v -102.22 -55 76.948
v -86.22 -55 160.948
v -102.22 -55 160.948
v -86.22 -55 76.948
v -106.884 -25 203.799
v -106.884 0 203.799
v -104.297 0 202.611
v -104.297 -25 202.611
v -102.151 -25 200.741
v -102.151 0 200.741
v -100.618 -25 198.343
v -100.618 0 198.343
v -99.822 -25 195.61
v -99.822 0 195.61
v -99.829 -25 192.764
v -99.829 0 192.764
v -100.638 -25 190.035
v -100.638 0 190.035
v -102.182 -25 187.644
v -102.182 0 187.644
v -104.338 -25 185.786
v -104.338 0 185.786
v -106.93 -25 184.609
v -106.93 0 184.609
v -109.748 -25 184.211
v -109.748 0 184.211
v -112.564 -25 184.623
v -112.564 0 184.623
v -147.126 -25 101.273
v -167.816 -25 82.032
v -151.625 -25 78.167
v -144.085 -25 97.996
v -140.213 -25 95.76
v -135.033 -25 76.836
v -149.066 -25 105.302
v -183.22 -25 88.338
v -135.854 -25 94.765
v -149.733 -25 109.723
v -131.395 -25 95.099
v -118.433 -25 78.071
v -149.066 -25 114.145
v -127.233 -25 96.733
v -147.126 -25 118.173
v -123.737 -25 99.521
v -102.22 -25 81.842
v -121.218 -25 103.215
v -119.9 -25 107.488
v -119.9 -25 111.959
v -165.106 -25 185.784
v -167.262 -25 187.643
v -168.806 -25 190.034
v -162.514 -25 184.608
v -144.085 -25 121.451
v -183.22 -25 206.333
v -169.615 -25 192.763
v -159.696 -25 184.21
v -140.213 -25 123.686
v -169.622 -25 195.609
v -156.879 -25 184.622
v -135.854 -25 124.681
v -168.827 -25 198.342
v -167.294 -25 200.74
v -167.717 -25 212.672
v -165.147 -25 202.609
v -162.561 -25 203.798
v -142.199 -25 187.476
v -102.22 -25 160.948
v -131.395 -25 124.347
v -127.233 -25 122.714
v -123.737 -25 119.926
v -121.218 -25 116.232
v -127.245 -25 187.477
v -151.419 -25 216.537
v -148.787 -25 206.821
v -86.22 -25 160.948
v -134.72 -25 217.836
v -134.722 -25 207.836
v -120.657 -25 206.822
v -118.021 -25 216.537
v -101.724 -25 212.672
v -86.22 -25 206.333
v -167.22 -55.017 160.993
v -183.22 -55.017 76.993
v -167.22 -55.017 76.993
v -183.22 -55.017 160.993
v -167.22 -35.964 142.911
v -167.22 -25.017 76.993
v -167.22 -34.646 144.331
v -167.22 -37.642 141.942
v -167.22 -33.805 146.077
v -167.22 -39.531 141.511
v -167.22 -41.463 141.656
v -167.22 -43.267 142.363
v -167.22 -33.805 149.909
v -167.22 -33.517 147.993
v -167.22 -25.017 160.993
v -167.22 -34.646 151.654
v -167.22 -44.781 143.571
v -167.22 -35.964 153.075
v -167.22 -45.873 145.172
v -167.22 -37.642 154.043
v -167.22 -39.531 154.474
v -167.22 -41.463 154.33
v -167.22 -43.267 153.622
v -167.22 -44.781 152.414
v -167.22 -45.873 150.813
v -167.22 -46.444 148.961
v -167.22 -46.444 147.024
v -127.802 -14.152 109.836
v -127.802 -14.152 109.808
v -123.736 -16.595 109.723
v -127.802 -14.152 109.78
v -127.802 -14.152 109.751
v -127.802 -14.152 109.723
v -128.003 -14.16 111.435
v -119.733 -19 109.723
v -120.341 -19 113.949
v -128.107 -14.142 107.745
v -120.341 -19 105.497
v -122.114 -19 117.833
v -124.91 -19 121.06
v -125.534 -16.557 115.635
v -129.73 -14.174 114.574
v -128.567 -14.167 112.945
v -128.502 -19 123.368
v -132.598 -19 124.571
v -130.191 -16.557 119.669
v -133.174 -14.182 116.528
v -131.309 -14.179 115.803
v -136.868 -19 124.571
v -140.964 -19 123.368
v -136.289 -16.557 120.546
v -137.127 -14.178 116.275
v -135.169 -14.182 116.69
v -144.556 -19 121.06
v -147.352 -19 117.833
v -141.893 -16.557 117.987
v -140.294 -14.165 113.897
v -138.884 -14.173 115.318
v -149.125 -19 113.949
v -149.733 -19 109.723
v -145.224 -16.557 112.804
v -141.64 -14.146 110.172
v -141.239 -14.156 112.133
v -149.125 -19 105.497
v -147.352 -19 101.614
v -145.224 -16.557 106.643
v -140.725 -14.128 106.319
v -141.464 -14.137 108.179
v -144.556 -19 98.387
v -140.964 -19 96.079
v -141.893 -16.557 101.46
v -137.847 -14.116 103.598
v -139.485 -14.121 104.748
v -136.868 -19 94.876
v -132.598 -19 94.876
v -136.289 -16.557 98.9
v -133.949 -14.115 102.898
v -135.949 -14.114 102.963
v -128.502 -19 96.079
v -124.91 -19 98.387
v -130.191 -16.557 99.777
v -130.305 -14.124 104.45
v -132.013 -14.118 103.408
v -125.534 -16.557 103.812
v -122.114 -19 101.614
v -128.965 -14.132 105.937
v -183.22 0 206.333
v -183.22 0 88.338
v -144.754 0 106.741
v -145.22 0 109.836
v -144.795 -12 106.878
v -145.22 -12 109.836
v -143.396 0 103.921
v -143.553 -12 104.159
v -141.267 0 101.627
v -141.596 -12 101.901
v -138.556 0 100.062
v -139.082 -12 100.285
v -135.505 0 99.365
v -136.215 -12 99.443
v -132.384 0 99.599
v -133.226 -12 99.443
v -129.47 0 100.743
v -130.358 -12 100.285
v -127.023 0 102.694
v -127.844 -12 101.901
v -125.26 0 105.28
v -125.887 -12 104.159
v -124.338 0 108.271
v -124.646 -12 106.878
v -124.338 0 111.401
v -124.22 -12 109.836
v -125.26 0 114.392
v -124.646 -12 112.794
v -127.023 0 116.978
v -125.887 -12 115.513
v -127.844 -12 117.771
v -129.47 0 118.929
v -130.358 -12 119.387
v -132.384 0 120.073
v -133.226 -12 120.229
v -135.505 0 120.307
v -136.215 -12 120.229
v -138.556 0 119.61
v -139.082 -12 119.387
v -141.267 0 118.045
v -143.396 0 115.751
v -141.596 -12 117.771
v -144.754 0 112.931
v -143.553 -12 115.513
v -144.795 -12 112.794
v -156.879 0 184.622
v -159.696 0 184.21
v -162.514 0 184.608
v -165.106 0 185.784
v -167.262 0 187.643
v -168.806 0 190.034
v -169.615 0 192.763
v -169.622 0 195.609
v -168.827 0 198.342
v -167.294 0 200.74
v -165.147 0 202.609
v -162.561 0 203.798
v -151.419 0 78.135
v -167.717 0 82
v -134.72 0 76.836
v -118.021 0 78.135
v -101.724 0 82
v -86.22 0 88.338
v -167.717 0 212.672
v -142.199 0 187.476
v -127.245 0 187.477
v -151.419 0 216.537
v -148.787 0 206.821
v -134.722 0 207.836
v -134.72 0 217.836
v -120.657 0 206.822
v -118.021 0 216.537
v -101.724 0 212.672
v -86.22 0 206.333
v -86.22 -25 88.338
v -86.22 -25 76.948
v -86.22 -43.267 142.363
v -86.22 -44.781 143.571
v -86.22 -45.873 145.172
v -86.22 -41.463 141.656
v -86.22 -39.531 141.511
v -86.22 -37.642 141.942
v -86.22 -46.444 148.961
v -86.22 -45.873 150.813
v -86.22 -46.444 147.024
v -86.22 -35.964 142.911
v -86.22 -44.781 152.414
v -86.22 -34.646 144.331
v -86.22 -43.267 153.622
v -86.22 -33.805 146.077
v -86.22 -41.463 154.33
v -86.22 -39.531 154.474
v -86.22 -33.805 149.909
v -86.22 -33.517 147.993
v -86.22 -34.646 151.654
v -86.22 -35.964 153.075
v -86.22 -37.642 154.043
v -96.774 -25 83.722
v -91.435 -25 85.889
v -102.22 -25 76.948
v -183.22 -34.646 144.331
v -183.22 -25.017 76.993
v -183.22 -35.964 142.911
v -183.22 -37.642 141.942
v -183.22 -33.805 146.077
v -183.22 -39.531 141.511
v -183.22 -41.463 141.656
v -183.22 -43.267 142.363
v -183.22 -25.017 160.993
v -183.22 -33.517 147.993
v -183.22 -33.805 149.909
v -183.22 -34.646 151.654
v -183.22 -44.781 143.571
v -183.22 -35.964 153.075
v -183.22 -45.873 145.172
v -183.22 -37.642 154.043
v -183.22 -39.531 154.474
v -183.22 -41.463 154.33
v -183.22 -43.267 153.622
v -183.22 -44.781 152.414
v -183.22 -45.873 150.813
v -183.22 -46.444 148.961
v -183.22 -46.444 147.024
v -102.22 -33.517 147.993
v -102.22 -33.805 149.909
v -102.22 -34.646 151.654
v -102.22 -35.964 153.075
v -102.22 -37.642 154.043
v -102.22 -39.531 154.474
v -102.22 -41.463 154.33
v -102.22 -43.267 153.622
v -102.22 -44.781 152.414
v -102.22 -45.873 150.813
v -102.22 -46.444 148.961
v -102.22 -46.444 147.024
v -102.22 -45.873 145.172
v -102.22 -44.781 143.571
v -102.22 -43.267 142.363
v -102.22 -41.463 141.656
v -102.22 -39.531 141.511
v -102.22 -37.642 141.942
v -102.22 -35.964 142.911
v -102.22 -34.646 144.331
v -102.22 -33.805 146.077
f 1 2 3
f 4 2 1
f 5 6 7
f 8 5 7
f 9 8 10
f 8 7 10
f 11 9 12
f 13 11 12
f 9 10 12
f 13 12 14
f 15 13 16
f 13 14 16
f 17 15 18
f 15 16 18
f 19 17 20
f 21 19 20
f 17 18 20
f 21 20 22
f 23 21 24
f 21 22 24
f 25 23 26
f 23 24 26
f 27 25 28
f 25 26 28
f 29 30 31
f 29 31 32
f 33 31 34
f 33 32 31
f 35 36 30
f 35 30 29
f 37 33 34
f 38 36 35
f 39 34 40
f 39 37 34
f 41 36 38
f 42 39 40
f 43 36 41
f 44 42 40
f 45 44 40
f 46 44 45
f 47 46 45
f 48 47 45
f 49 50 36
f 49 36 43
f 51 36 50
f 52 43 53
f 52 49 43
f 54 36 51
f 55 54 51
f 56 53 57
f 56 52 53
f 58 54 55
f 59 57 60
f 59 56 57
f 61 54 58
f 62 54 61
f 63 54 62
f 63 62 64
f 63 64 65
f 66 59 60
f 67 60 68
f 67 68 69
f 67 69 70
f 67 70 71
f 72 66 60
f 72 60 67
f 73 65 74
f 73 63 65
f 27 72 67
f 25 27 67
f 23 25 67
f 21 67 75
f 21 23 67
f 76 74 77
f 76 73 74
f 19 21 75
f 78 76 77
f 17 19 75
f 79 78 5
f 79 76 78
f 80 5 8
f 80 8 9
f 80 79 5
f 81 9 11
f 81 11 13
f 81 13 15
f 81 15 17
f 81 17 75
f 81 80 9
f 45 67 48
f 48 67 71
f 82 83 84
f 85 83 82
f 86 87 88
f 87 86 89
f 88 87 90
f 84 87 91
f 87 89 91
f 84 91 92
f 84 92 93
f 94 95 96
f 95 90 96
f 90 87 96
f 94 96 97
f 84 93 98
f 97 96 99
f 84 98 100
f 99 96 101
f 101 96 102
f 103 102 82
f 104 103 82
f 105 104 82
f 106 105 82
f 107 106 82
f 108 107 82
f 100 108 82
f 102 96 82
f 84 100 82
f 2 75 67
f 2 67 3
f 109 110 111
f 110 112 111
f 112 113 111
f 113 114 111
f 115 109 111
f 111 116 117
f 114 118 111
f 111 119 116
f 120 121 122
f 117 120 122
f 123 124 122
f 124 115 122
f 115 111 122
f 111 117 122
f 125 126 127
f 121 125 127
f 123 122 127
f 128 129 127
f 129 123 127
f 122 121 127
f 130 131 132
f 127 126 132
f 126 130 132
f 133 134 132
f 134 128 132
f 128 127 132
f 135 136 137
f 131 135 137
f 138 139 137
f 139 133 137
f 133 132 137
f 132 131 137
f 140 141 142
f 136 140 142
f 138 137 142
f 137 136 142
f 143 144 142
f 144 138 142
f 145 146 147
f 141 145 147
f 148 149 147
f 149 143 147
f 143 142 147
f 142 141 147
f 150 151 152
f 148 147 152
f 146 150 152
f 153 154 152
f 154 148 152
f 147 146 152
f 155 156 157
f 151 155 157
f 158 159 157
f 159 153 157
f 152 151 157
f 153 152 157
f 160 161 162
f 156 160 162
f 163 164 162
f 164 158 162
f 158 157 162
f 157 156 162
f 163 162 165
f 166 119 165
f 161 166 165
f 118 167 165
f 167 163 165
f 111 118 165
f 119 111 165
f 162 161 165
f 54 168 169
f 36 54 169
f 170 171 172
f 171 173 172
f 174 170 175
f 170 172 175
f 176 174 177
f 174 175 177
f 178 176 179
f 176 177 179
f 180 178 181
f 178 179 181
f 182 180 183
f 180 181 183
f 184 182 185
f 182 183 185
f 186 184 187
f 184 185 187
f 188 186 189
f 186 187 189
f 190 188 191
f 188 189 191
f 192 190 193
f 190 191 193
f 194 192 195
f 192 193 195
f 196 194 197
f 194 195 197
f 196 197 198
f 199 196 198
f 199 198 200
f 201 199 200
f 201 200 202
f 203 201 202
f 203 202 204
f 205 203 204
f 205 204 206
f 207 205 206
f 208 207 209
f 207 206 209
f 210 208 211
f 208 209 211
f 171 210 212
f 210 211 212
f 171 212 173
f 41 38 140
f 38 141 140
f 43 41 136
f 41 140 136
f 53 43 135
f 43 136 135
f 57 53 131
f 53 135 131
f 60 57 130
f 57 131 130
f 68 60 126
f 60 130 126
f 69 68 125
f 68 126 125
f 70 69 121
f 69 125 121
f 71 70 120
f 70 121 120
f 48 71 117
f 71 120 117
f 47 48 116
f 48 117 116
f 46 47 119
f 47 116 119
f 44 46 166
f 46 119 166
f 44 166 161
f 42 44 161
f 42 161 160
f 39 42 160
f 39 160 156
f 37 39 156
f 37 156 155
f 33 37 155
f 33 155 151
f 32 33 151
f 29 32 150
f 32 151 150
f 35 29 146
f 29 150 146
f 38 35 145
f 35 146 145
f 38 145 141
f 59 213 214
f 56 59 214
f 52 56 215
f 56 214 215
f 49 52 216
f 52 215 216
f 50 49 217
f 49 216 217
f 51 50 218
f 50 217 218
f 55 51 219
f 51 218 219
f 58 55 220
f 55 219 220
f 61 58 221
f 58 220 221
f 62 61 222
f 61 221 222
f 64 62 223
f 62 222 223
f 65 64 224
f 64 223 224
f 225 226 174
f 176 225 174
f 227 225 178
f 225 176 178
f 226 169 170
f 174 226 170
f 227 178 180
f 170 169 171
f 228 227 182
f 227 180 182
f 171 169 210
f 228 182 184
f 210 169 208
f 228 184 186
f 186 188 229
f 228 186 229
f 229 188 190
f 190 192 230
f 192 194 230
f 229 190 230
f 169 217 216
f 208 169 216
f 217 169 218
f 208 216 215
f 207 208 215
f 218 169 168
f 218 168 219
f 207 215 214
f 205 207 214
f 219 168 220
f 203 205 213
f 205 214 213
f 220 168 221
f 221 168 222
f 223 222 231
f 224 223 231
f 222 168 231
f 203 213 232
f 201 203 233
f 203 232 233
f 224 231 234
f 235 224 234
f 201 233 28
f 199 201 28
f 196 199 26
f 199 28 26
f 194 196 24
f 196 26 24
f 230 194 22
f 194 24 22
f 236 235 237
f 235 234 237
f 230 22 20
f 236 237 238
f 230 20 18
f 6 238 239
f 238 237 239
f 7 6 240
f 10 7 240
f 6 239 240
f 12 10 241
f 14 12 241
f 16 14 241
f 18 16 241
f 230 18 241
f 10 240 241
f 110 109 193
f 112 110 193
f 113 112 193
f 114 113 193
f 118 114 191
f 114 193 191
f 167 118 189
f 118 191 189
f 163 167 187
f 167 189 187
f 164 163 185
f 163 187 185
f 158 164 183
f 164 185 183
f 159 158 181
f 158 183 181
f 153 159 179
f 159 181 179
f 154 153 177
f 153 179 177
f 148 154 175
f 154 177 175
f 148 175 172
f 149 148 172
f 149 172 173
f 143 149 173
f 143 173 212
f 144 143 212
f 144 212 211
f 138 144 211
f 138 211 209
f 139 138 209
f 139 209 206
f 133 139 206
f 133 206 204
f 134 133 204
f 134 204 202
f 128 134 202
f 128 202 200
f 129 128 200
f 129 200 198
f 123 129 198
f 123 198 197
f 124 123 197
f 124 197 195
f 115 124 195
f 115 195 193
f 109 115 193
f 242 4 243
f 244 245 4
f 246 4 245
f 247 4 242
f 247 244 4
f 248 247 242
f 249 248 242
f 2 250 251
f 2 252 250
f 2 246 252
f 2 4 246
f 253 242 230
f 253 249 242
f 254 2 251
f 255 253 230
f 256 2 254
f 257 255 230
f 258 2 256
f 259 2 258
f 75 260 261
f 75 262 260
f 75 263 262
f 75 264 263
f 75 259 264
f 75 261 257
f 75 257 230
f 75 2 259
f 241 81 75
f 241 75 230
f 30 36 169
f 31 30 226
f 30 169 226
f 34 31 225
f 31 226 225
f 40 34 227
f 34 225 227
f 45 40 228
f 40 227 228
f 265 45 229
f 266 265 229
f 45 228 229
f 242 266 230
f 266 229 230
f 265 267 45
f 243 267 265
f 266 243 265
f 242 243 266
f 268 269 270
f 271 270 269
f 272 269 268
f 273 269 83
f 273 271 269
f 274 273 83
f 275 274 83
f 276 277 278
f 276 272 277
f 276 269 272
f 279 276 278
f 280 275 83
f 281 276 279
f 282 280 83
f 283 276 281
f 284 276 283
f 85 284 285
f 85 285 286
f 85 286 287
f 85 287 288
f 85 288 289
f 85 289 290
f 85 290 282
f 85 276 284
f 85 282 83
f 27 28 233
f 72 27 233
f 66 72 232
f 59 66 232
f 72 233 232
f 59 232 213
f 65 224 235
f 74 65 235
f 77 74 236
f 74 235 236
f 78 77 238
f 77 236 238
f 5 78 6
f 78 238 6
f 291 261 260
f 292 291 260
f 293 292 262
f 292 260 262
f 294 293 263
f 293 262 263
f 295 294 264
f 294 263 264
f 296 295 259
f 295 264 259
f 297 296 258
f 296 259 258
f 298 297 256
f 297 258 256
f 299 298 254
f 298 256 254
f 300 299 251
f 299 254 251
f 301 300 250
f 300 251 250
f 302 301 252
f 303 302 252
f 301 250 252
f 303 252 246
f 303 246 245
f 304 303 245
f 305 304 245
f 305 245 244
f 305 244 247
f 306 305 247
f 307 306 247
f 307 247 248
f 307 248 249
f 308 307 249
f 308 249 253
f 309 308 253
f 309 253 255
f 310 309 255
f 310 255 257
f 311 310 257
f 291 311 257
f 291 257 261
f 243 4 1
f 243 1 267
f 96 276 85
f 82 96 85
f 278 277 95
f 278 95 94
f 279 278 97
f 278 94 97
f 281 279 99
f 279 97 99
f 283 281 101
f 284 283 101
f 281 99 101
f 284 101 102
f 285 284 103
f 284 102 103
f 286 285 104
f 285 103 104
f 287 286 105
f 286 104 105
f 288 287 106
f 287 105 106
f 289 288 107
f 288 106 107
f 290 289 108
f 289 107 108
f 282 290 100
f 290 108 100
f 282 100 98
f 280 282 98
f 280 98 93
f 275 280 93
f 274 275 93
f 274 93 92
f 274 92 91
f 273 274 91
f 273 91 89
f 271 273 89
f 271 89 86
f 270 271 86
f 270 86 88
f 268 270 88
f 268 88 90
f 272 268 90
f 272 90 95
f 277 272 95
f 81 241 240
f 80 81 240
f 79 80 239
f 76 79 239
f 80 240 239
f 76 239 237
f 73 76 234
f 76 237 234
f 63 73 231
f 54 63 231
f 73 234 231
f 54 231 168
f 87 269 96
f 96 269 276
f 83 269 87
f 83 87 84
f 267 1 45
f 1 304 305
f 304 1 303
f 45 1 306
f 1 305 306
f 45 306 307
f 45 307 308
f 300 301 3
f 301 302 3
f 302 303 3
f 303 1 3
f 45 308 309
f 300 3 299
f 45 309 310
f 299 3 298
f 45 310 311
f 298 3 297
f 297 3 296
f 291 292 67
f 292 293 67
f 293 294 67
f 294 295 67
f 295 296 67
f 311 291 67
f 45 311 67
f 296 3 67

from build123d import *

# Parameters (mm, degrees)
F1_DEPTH = 25
F2_D     = 21
F2_DEPTH = 12
F2_TIP   = 6.3090364998
F4_D     = 30
F4_DEPTH = 6
F4_TIP   = 9.0129092854
F6_DEPTH = 16
F7_W     = 30
F7_H     = 84
F8_DEPTH = 16
F10_D    = 13
F10_2_D  = 13


with BuildPart() as f1:
    # F0 (on Front) → F1 (new body)
    with BuildSketch(Plane.XZ):
        with BuildLine():
            ThreePointArc((-86.2202922475, 206.3332887963), (-134.7202922475, 217.8358795047), (-183.2202922475, 206.3332887963))
            Line((-183.2202922475, 206.3332887963), (-183.2202922475, 88.338470213))
            ThreePointArc((-183.2202922475, 88.338470213), (-134.7202922475, 76.8358795047), (-86.2202922475, 88.338470213))
            Line((-86.2202922475, 88.338470213), (-86.2202922475, 206.3332887963))
        make_face()
        with BuildLine():
            ThreePointArc((-162.5612013385, 203.7980196516), (-134.7224408787, 207.8358794811), (-106.8835033872, 203.7992403745))
            ThreePointArc((-106.8835033872, 203.7992403745), (-100.1358939985, 191.3706536673), (-112.5644807056, 184.6230442786))
            ThreePointArc((-112.5644807056, 184.6230442786), (-134.7220023826, 187.8358794859), (-156.8793831566, 184.6220726829))
            ThreePointArc((-156.8793831566, 184.6220726829), (-169.3082657319, 191.3691370763), (-162.5612013385, 203.7980196516))
        make_face(mode=Mode.SUBTRACT)
    extrude(amount=F1_DEPTH)

    # F2
    with Locations(Plane(origin=(0, 0, 0), x_dir=(1, 0, 0), z_dir=(0, 1, 0))):
        with Locations((-134.7202922475, -109.8358795047)):
            Hole(F2_D / 2, depth=F2_DEPTH)
            with Locations((0, 0, -(F2_DEPTH + F2_TIP / 2))):  # 118° drill point
                Cone(0, F2_D / 2, F2_TIP, mode=Mode.SUBTRACT)

    # F4
    with Locations(Plane.XZ.offset(25)):
        with Locations((-134.73290205, 109.7232922912)):
            Hole(F4_D / 2, depth=F4_DEPTH)
            with Locations((0, 0, -(F4_DEPTH + F4_TIP / 2))):  # 118° drill point
                Cone(0, F4_D / 2, F4_TIP, mode=Mode.SUBTRACT)

    # F5 (on face) → F6 (join)
    with BuildSketch(Plane.YZ.offset(-86.2202922475)):
        Polygon((-55, 76.9482627511), (-25, 76.9482627511), (-25, 88.338470213), (-25, 160.9482627511), (-55, 160.9482627511), align=None)
    extrude(amount=-F6_DEPTH)

    # F10 (through all)
    with Locations(Plane(origin=(-183.2202922475, 0, 0), x_dir=(0, -1, 0), z_dir=(-1, 0, 0))):
        with Locations((40.0165704638, 147.9926086068)):
            Hole(F10_D / 2)


with BuildPart() as f8:
    # F7 (on face) → F8 (new body)
    with BuildSketch(Plane(origin=(-183.2202922475, 0, 0), x_dir=(0, -1, 0), z_dir=(-1, 0, 0))):
        with Locations((40.0165704638, 118.9926086068)):
            Rectangle(F7_W, F7_H)
    extrude(amount=-F8_DEPTH)

    # F10#2 (through all)
    with Locations(Plane(origin=(-183.2202922475, 0, 0), x_dir=(0, -1, 0), z_dir=(-1, 0, 0))):
        with Locations((40.0165704638, 147.9926086068)):
            Hole(F10_2_D / 2)


solid = Compound([f1.part, f8.part])
